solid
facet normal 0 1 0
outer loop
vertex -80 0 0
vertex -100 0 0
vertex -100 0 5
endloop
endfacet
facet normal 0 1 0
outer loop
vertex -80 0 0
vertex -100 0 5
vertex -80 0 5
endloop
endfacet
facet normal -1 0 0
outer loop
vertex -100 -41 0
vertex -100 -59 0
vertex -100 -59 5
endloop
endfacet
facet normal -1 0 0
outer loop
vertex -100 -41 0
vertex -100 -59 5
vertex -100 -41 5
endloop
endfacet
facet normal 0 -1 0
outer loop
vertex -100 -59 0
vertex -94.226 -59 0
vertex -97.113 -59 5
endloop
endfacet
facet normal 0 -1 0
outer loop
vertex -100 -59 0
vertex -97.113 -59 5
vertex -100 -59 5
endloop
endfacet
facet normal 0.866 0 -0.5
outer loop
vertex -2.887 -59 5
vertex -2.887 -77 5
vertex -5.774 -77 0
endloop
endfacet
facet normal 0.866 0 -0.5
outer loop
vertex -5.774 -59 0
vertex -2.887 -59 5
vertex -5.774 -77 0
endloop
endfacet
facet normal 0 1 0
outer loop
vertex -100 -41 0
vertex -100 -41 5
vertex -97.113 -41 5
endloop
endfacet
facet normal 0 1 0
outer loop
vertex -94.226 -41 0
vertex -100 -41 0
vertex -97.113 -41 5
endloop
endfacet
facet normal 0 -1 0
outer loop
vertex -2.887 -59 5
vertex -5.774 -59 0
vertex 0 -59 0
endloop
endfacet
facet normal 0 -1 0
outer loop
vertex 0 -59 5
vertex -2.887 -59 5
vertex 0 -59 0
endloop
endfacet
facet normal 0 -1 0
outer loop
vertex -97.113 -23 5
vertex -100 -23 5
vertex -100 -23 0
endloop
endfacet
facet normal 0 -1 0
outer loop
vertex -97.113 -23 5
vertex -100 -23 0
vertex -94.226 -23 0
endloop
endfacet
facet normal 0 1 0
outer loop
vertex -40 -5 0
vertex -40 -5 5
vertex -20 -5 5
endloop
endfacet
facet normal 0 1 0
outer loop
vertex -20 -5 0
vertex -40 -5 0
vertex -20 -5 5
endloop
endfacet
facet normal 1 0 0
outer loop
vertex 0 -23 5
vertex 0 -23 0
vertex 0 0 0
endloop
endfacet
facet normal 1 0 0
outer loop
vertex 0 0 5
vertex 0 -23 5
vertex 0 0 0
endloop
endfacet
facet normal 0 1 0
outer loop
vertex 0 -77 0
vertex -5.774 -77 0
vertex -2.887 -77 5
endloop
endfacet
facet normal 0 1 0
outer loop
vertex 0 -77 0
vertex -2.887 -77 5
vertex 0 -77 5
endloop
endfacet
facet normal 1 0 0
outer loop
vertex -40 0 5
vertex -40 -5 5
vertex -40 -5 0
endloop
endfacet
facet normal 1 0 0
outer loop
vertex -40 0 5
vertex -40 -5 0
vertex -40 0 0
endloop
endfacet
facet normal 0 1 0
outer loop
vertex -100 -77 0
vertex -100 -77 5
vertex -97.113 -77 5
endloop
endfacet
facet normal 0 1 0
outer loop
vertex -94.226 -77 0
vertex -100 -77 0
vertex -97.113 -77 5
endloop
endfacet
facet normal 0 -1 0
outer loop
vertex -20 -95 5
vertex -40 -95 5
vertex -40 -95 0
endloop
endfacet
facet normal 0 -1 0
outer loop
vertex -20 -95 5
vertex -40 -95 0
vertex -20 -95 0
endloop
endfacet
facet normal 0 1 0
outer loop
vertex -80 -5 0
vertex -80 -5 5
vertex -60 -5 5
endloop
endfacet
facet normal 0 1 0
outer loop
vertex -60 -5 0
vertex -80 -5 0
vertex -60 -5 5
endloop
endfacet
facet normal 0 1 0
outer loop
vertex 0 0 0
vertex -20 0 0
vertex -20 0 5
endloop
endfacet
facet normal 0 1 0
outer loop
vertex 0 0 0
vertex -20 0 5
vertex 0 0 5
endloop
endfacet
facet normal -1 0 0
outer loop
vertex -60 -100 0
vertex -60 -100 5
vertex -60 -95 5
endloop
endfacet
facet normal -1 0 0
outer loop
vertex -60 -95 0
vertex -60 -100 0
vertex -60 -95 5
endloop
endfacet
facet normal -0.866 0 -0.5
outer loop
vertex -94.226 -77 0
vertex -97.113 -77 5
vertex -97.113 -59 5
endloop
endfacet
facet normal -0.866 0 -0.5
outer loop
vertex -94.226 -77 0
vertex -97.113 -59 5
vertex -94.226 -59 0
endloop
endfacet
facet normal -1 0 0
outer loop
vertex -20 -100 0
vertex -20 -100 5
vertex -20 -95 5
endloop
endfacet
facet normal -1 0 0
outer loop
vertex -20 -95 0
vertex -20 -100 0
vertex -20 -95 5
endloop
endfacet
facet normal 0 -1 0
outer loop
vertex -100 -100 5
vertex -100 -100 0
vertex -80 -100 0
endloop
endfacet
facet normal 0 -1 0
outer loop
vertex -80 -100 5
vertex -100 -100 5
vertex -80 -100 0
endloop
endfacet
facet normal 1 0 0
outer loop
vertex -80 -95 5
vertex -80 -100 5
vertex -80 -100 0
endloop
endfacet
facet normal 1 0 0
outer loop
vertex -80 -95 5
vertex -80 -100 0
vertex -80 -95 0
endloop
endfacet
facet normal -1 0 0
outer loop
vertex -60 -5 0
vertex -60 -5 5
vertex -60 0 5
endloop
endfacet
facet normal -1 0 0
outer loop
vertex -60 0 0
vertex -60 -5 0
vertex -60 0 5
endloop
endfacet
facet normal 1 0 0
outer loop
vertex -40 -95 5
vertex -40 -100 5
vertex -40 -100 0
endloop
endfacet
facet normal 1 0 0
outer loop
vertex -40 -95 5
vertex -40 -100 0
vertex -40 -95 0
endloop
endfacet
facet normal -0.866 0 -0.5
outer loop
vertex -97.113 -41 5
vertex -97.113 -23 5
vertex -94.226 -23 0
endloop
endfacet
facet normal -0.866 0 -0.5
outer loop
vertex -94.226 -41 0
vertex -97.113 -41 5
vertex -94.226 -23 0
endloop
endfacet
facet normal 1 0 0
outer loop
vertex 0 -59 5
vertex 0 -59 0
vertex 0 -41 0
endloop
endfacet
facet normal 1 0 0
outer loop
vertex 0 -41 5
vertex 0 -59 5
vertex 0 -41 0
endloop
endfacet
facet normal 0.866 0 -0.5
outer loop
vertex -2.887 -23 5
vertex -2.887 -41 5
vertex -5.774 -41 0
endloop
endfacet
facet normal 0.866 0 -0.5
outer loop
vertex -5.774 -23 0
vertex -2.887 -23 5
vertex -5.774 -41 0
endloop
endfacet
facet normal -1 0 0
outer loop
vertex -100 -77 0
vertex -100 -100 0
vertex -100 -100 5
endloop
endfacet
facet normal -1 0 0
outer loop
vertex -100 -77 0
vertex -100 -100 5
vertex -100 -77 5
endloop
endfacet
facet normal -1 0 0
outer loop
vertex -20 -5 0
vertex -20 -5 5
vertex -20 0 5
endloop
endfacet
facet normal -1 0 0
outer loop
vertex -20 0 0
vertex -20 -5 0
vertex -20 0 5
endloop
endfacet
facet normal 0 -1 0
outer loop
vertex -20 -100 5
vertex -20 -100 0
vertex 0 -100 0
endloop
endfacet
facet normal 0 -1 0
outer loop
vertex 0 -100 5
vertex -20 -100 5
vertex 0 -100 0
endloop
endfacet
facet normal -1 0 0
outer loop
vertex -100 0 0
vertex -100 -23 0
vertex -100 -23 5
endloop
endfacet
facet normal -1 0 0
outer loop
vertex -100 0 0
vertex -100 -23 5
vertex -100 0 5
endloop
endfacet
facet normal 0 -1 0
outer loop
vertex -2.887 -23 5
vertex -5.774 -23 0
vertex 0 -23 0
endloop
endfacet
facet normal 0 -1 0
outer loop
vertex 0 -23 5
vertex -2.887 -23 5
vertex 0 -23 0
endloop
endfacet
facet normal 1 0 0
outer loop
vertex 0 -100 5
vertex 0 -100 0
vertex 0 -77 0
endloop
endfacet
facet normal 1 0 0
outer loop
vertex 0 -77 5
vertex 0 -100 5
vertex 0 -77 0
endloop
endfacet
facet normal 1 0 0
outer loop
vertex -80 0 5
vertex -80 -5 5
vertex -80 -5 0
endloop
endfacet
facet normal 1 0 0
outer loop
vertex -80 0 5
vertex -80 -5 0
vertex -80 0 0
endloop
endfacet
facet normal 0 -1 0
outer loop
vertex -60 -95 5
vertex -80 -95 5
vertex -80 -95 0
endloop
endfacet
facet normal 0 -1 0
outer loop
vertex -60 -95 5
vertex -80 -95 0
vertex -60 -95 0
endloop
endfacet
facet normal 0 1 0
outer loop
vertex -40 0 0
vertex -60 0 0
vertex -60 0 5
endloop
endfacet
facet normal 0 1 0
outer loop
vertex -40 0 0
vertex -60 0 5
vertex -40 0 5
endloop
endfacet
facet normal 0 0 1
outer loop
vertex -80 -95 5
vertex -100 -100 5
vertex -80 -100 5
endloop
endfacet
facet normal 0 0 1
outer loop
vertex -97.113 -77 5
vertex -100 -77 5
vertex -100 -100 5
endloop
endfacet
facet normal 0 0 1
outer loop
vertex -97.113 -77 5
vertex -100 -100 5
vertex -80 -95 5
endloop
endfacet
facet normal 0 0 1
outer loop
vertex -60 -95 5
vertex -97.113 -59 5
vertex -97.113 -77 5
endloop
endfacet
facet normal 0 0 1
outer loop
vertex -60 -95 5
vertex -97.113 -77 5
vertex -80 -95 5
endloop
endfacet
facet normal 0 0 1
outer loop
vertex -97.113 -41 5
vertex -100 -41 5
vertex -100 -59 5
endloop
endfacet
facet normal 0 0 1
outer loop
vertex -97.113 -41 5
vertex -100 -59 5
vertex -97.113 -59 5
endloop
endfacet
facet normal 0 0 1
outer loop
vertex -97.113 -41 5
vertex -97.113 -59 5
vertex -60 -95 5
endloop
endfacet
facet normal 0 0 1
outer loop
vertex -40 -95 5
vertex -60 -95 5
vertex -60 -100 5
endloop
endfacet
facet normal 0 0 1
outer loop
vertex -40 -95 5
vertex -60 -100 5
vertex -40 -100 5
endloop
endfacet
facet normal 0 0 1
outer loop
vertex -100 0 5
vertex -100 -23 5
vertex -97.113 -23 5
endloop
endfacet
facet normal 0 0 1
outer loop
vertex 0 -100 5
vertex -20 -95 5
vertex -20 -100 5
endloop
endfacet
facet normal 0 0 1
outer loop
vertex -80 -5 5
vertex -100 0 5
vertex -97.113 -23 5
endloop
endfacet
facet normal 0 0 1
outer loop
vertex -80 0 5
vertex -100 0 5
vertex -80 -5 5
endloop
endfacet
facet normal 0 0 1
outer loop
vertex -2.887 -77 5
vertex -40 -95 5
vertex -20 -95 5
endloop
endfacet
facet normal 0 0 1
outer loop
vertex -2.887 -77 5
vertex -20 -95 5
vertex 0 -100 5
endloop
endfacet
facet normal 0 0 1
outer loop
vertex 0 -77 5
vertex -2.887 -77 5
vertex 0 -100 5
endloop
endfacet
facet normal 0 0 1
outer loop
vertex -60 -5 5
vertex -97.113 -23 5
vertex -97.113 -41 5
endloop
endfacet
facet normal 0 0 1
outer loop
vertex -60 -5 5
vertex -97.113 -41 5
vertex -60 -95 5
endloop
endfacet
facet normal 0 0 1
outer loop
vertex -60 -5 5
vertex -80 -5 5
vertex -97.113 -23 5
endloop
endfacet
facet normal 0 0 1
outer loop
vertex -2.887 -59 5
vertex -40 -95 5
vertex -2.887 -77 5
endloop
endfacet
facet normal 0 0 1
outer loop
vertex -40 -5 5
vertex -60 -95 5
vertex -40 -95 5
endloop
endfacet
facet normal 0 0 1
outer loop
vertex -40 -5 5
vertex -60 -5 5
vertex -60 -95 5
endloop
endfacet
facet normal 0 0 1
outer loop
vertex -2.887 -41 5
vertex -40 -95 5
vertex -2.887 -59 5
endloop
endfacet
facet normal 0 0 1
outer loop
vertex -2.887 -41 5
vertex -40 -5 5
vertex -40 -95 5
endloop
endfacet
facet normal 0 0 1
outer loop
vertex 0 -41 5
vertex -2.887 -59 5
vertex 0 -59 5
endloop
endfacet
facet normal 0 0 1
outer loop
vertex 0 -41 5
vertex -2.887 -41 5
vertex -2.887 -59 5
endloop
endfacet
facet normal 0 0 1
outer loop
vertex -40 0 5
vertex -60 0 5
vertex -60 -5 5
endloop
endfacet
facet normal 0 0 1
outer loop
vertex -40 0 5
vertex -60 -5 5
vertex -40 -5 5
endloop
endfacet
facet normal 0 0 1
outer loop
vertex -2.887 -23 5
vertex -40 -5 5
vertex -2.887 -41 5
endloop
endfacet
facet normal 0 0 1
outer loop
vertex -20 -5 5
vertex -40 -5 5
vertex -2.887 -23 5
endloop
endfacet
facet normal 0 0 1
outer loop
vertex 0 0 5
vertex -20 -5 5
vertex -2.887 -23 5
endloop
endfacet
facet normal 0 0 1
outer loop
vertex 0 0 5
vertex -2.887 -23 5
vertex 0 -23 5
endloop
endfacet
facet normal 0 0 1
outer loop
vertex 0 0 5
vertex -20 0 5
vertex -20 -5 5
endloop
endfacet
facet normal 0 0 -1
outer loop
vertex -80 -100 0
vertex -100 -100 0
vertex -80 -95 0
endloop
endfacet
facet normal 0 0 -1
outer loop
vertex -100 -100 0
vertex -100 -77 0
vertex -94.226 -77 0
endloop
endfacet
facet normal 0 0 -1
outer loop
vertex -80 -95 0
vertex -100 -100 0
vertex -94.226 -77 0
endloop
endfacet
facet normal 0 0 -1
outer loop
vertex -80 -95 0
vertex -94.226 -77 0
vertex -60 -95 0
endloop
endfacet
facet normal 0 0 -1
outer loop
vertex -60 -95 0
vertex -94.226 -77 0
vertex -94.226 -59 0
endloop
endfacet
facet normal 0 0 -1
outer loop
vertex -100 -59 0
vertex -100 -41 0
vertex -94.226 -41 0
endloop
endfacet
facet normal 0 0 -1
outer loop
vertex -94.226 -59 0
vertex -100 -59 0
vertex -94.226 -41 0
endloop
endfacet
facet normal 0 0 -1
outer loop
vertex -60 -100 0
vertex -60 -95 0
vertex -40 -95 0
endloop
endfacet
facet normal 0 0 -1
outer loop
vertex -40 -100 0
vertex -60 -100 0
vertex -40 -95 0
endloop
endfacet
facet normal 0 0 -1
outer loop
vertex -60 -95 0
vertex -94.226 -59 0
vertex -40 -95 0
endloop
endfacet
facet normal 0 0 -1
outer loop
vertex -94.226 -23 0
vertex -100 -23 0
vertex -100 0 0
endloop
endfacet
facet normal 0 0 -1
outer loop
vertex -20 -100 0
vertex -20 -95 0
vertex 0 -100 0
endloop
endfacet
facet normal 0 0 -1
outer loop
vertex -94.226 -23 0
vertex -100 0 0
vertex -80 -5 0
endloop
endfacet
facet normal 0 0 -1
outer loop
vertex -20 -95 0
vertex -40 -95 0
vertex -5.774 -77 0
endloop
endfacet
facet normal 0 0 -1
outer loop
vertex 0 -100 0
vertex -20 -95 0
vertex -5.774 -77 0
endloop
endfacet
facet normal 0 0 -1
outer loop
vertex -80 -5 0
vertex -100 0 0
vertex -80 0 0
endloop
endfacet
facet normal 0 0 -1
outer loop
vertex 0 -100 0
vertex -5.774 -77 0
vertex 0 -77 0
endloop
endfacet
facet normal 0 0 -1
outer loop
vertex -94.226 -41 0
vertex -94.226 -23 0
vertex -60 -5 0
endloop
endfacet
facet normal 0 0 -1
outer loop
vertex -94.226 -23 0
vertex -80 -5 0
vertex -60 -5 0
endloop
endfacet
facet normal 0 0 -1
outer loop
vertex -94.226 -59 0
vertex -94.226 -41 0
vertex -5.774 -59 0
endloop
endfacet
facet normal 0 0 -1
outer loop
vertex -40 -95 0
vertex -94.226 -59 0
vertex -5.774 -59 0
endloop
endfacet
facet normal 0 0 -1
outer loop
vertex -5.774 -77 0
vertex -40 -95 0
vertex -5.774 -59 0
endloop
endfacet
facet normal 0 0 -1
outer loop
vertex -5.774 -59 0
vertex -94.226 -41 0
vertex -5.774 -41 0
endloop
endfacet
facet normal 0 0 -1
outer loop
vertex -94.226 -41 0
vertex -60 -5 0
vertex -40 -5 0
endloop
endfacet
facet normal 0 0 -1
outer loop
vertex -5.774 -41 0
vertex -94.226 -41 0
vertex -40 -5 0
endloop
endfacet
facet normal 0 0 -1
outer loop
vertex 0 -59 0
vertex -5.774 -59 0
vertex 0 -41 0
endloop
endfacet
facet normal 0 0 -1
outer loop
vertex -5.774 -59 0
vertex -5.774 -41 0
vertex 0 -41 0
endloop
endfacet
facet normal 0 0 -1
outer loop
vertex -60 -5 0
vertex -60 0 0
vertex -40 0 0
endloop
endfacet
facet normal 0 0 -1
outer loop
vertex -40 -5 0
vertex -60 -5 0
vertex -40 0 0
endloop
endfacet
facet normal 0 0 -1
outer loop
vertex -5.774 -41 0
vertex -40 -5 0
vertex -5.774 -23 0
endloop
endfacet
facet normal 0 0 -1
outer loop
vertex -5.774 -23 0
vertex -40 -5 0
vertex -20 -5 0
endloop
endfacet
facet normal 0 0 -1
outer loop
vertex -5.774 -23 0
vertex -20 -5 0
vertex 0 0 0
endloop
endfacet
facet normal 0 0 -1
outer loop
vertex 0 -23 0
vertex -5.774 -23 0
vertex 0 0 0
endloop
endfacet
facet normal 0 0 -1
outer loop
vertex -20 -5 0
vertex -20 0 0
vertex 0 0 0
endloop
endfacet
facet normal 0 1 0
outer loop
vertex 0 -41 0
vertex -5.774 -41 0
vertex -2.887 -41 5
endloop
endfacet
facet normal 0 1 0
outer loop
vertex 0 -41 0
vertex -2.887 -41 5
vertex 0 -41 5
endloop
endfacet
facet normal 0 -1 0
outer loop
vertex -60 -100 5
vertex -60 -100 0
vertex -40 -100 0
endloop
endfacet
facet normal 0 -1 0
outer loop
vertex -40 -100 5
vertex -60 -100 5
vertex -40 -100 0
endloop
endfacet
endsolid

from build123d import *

# Parameters (mm, degrees)
ESQUISSE1_W             = 100
ESQUISSE1_H             = 100
BOSS_EXTRU_1_DEPTH      = 5
ESQUISSE2_W             = 20
ESQUISSE2_H             = 5
ENL_V_MAT_EXTRU_1_DEPTH = 142.509716981
ESQUISSE3_W             = 2.886751346
ESQUISSE3_H             = 18
ENL_V_MAT_EXTRU_2_DEPTH = 142.509716981
ENL_V_MAT_EXTRU_5_DEPTH = 18
ENL_V_MAT_EXTRU_6_DEPTH = 18
ENL_V_MAT_EXTRU_7_DEPTH = 18
ENL_V_MAT_EXTRU_8_DEPTH = 18


with BuildPart() as part:
    # Esquisse1 → Boss.-Extru.1 (new body)
    with BuildSketch(Plane.XY):
        with Locations((-50, -50)):
            Rectangle(ESQUISSE1_W, ESQUISSE1_H)
    extrude(amount=BOSS_EXTRU_1_DEPTH)

    # Esquisse2 → Enlèv. mat.-Extru.1 (cut, through all)
    with BuildSketch(Plane.XY.offset(5)):
        with Locations((-70, -2.5)):
            Rectangle(ESQUISSE2_W, ESQUISSE2_H)
        with Locations((-30, -2.5)):
            Rectangle(ESQUISSE2_W, ESQUISSE2_H)
        with Locations((-30, -97.5)):
            Rectangle(ESQUISSE2_W, ESQUISSE2_H)
        with Locations((-70, -97.5)):
            Rectangle(ESQUISSE2_W, ESQUISSE2_H)
    extrude(amount=-ENL_V_MAT_EXTRU_1_DEPTH, mode=Mode.SUBTRACT)

    # Esquisse3 → Enlèv. mat.-Extru.2 (cut, through all)
    with BuildSketch(Plane.XY.offset(5)):
        with Locations((-98.556624327, -32)):
            Rectangle(ESQUISSE3_W, ESQUISSE3_H)
        with Locations((-98.556624327, -68)):
            Rectangle(ESQUISSE3_W, ESQUISSE3_H)
        with Locations((-1.443375673, -68)):
            Rectangle(ESQUISSE3_W, ESQUISSE3_H)
        with Locations((-1.443375673, -32)):
            Rectangle(ESQUISSE3_W, ESQUISSE3_H)
    extrude(amount=-ENL_V_MAT_EXTRU_2_DEPTH, mode=Mode.SUBTRACT)

    # Esquisse5 → Enlèv. mat.-Extru.5 (cut)
    with BuildSketch(Plane.XZ.offset(59)):
        Polygon((-97.113248654, 0), (-97.113248654, 5), (-94.226497308, 0), align=None)
    extrude(amount=ENL_V_MAT_EXTRU_5_DEPTH, mode=Mode.SUBTRACT)

    # Esquisse6 → Enlèv. mat.-Extru.6 (cut)
    with BuildSketch(Plane(origin=(0, -41, 0), x_dir=(1, 0, 0), z_dir=(0, 1, 0))):
        Polygon((-97.113248654, 0), (-97.113248654, -5), (-94.226497308, 0), align=None)
    extrude(amount=ENL_V_MAT_EXTRU_6_DEPTH, mode=Mode.SUBTRACT)

    # Esquisse7 → Enlèv. mat.-Extru.7 (cut)
    with BuildSketch(Plane.XZ.offset(59)):
        Polygon((-2.886751346, 0), (-2.886751346, 5), (-5.773502692, 0), align=None)
    extrude(amount=ENL_V_MAT_EXTRU_7_DEPTH, mode=Mode.SUBTRACT)

    # Esquisse8 → Enlèv. mat.-Extru.8 (cut)
    with BuildSketch(Plane.XZ.offset(23)):
        Polygon((-2.886751346, 0), (-2.886751346, 5), (-5.773502692, 0), align=None)
    extrude(amount=ENL_V_MAT_EXTRU_8_DEPTH, mode=Mode.SUBTRACT)


solid = part.part
